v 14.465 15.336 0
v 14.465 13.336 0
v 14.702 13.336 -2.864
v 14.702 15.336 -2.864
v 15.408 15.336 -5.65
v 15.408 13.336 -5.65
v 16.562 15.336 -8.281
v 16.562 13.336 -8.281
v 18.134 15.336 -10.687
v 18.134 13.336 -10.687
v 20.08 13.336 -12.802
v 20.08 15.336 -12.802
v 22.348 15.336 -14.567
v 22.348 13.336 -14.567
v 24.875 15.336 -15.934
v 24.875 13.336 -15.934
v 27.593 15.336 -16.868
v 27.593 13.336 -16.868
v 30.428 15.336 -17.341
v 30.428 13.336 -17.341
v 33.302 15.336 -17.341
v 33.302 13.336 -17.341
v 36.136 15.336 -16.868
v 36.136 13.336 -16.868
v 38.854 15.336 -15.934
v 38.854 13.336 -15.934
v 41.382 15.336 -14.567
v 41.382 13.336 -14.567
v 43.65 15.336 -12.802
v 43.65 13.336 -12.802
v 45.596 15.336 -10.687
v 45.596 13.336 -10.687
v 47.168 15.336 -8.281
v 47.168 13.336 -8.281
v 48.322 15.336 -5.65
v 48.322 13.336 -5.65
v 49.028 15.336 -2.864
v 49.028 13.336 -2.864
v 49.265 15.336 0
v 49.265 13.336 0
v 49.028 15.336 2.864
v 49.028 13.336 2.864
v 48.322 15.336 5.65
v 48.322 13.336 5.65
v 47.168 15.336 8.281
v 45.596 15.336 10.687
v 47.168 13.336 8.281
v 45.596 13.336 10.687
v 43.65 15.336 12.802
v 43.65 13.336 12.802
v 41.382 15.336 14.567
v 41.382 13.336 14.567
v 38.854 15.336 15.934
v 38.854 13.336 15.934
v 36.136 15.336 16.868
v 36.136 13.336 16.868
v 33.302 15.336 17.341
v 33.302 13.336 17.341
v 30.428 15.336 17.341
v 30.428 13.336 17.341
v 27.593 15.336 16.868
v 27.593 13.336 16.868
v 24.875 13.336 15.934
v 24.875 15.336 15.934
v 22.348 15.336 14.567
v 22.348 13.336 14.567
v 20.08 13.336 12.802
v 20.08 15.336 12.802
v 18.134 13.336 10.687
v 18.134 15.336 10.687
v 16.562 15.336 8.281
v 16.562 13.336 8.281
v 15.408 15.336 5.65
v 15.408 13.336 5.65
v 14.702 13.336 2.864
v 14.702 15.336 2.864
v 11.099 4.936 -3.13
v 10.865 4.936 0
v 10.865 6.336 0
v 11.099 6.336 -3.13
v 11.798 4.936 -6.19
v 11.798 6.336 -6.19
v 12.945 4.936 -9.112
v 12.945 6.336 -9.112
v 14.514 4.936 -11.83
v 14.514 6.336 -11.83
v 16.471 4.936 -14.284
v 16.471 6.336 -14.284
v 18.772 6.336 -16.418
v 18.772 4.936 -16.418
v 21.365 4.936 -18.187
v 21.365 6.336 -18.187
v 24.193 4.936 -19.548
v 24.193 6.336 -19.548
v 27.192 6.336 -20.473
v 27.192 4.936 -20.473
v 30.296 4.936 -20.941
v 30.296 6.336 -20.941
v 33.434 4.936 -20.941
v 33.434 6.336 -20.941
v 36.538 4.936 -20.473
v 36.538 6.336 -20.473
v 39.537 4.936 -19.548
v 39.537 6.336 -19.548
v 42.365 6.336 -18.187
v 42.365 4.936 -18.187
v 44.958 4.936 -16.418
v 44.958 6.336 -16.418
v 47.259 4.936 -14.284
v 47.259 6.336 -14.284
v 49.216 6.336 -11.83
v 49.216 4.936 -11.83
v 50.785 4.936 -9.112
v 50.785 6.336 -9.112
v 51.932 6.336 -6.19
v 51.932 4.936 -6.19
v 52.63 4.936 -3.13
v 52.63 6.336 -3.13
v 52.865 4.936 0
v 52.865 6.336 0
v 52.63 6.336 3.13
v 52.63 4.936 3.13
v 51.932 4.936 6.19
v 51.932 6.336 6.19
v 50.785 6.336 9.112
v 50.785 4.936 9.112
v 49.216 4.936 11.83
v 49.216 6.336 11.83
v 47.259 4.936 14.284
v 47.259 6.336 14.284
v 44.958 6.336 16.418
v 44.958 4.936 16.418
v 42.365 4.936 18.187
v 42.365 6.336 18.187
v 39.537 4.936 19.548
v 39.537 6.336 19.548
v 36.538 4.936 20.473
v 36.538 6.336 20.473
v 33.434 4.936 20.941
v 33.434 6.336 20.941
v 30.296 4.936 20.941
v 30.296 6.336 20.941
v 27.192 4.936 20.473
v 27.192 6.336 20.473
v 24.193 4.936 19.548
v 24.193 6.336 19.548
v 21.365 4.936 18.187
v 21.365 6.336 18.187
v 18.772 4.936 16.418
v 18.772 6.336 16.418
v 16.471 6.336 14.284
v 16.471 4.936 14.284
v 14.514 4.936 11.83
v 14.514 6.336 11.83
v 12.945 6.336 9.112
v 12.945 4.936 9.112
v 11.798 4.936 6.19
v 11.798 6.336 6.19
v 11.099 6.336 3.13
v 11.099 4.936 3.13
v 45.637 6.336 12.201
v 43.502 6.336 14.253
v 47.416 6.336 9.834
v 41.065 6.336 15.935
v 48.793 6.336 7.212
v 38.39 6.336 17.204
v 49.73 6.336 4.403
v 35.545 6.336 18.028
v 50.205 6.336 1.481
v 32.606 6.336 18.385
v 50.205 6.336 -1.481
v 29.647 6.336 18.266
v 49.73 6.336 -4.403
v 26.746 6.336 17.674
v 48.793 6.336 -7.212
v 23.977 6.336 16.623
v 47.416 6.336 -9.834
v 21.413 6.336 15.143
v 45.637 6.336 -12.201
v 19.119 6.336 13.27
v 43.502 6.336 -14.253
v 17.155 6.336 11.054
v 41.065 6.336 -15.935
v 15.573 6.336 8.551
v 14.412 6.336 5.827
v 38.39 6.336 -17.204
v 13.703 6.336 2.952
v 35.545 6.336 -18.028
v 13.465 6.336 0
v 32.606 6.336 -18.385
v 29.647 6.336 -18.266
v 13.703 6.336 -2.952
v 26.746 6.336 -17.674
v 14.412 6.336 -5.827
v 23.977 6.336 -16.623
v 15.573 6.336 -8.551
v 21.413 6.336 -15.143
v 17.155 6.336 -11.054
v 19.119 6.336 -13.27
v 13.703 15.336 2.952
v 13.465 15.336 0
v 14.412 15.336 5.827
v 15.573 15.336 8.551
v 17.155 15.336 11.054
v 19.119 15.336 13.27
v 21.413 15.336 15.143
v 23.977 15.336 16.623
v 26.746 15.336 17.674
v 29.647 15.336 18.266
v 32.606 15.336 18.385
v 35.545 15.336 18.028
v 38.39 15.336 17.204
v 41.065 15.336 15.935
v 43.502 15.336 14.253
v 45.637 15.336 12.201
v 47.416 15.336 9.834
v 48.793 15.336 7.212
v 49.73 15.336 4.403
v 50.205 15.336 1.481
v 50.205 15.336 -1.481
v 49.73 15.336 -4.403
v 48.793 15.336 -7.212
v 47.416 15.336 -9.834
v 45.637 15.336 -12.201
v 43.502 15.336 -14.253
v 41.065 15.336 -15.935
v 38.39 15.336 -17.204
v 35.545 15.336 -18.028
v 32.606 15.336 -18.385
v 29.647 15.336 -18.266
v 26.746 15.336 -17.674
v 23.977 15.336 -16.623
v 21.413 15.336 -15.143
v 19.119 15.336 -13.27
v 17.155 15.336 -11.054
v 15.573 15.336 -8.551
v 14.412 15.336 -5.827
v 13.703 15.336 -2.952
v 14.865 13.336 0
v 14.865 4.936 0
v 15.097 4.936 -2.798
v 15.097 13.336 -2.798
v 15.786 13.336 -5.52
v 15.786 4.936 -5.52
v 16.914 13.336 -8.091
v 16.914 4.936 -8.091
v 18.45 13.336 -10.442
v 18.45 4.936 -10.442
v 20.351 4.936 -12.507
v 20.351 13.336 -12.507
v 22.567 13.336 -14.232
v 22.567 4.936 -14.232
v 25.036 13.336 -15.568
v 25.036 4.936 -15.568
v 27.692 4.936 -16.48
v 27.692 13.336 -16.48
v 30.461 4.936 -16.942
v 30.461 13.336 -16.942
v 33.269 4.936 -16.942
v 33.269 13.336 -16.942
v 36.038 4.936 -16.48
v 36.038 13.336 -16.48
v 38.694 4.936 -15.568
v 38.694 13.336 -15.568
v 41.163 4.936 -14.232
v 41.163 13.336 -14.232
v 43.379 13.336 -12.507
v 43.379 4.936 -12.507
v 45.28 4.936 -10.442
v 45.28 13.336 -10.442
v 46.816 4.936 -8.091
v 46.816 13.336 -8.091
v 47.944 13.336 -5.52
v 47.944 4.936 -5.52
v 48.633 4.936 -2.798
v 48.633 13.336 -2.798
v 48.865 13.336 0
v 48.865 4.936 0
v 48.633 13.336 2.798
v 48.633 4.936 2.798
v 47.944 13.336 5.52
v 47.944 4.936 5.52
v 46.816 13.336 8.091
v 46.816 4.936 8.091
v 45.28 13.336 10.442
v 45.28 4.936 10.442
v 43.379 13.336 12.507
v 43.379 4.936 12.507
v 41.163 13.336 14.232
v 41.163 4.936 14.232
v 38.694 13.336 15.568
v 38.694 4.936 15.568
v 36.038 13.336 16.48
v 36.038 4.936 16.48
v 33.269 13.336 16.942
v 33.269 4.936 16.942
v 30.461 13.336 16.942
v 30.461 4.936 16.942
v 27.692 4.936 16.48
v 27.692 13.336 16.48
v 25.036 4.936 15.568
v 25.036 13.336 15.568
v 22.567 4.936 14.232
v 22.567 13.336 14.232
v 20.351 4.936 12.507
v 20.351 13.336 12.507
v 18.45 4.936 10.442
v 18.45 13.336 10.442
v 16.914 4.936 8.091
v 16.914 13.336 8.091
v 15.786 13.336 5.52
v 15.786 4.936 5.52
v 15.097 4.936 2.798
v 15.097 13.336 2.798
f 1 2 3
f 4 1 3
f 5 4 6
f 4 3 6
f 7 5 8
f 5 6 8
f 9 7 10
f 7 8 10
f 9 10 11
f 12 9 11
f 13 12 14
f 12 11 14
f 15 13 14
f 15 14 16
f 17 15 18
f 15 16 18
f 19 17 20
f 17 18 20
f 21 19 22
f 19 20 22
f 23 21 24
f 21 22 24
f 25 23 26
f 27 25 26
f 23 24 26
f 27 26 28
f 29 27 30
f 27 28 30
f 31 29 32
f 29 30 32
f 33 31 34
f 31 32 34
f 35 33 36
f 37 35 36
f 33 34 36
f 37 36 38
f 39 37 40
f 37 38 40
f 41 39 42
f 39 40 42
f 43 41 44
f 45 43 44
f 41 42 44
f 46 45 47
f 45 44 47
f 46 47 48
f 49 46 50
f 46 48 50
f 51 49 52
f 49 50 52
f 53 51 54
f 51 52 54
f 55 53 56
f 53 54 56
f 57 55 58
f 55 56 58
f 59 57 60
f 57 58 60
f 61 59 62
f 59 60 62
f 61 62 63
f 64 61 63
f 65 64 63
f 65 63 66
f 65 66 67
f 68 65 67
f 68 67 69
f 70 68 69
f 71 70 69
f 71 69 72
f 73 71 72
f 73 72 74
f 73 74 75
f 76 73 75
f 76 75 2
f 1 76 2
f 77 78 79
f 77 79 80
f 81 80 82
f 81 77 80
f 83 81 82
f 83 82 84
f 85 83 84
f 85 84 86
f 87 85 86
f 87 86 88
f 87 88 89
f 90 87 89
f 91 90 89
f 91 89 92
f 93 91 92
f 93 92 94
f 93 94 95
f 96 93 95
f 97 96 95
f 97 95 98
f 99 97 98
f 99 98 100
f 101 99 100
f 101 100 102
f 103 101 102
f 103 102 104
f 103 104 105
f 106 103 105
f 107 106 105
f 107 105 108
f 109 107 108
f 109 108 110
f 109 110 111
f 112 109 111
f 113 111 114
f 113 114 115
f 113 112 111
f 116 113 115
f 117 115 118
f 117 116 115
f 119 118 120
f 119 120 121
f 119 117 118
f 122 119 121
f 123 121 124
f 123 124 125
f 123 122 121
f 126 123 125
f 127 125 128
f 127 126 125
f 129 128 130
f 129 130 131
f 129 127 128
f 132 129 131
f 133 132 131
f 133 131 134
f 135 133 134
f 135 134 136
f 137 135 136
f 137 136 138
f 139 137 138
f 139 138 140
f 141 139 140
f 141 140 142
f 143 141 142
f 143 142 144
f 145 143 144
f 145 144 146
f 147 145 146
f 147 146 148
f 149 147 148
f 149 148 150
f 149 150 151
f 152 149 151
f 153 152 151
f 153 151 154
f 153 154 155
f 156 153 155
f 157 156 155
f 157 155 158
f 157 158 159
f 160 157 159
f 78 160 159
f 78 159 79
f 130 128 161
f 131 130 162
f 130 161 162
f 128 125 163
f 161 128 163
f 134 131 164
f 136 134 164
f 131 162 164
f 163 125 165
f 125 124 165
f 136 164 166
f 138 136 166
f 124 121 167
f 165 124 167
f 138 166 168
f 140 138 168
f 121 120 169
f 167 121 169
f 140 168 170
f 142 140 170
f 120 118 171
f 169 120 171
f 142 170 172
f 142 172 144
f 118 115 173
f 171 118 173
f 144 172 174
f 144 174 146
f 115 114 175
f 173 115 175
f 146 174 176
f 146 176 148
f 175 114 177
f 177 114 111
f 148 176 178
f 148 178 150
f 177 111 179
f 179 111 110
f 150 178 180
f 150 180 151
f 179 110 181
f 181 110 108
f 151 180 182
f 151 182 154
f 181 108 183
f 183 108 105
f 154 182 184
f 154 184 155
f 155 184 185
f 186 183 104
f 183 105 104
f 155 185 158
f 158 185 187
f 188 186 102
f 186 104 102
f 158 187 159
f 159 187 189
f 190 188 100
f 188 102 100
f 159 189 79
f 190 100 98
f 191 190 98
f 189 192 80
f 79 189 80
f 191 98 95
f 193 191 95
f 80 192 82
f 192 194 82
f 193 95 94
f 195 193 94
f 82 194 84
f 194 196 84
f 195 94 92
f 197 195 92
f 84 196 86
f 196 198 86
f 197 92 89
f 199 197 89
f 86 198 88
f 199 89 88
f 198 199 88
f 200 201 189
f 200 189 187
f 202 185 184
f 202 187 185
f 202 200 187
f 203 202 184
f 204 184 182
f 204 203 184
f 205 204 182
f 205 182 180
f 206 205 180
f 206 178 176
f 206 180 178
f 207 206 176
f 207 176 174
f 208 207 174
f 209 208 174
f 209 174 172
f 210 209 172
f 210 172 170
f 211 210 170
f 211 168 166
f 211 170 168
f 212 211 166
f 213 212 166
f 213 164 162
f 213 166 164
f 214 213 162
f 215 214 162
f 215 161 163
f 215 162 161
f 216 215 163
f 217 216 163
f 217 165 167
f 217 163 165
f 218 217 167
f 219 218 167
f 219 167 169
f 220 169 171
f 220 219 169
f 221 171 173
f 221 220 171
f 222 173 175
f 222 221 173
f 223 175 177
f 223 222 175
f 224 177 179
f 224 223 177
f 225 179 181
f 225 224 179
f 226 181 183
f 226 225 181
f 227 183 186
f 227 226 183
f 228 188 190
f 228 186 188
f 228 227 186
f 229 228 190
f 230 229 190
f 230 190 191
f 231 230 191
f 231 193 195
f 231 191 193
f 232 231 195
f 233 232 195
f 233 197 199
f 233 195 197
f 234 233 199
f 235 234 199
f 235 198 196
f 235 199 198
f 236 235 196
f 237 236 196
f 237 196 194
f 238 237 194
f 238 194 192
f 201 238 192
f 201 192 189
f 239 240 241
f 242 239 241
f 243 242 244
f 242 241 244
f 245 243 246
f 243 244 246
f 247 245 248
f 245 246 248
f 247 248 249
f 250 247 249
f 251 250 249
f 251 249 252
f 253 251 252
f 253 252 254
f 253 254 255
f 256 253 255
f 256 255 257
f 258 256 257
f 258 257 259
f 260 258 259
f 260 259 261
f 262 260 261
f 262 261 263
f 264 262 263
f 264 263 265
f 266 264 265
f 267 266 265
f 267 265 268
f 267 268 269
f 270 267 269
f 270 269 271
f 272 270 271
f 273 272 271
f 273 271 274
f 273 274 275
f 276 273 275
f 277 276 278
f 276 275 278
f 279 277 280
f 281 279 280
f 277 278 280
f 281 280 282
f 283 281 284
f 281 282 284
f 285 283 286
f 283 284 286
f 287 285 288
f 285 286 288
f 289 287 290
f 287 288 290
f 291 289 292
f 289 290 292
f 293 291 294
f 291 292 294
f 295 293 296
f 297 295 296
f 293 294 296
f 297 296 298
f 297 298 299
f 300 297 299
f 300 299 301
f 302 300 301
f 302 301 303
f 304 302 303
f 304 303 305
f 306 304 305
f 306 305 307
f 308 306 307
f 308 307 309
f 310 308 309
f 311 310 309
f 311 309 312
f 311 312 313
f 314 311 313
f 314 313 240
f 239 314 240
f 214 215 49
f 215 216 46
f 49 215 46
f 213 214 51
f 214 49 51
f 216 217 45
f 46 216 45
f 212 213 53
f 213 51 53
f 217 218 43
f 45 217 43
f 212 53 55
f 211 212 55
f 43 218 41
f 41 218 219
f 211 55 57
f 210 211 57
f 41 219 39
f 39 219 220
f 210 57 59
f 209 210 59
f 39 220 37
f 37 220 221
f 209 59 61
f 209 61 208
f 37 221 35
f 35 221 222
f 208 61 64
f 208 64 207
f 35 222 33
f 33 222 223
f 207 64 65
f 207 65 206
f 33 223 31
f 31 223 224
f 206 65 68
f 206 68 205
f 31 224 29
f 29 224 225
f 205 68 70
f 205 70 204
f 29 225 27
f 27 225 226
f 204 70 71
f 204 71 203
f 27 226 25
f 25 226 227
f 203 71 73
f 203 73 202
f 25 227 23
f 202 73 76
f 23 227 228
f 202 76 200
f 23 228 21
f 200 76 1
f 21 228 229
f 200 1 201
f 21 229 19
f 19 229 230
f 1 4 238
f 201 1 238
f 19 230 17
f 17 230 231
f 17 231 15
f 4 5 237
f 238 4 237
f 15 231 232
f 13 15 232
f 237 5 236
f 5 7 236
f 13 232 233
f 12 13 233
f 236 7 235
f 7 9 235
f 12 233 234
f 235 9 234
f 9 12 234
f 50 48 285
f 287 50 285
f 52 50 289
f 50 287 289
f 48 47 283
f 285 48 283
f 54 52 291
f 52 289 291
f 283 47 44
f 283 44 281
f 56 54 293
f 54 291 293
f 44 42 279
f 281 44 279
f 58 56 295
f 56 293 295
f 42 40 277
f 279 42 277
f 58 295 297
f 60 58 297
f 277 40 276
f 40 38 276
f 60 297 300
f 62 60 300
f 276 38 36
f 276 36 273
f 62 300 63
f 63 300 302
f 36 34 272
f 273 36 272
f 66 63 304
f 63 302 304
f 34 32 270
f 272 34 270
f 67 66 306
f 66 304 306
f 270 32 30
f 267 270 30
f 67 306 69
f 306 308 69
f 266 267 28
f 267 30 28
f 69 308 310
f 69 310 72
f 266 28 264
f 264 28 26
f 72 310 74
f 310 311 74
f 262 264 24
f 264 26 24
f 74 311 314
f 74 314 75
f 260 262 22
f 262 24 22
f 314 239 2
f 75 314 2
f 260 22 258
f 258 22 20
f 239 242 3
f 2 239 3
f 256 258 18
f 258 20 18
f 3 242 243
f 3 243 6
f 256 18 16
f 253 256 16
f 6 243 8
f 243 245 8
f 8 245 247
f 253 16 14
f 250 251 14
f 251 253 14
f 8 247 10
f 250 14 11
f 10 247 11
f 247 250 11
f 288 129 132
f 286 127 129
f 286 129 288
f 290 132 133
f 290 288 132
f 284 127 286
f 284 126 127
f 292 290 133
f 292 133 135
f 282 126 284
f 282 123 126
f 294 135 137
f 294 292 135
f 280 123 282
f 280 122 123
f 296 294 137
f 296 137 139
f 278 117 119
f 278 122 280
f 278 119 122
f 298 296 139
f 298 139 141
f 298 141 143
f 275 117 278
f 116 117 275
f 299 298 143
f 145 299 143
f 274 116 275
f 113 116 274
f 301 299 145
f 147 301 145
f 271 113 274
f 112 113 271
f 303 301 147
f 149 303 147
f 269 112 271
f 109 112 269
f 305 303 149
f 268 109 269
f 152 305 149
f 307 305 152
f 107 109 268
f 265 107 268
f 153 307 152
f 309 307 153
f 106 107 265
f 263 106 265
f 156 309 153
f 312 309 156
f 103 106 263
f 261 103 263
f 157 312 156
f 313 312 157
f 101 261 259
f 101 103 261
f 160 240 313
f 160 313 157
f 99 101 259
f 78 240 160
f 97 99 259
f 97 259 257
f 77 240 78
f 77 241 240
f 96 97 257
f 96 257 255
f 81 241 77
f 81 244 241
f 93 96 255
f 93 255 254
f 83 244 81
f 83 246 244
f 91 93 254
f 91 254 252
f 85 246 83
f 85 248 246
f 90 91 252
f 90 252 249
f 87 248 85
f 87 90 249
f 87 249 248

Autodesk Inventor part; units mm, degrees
ref_plane "YZ Plane" through (0, 0, 0) normal (1, 0, 0) x (0, 1, 0)
ref_plane "XZ Plane" through (0, 0, 0) normal (0, 1, 0) x (-1, 0, 0)
ref_plane "XY Plane" through (0, 0, 0) normal (0, 0, 1) x (1, 0, 0)
sketch "Sketch1" plane through (0, 0, 0) normal (0, 0, 1) x (1, 0, 0)
  line L0 (10.8649, 4.9355) -> (14.8649, 4.9355)
  line L1 (13.4649, 6.3355) -> (10.8649, 6.3355)
  line L2 (10.8649, 6.3355) -> (10.8649, 4.9355)
  line L3 (13.4649, 6.3355) -> (13.4649, 15.3355)
  line L4 (13.4649, 15.3355) -> (14.4649, 15.3355)
  line L5 (14.4649, 15.3355) -> (14.4649, 13.3355)
  line L6 (14.4649, 13.3355) -> (14.8649, 13.3355)
  line L7 (14.8649, 13.3355) -> (14.8649, 4.9355)
  line L8 (31.8649, 18.7517) -> (31.8649, 1.3446)
  dimension "d4" = 9
  dimension "d6" = 1
  dimension "d7" = 2
  dimension "d10" = 0.4
  dimension "d12" = 8.4
  dimension "d13" = 21
  dimension "d15" = 18.4
  dimension "d17" = 1.4
revolve "Revolution1" add sketch "Sketch1" angle 360 about axis through (31.8649, 18.7517, 0) along (0, -1, 0)
properties part number "mask_breath_top_lc"
